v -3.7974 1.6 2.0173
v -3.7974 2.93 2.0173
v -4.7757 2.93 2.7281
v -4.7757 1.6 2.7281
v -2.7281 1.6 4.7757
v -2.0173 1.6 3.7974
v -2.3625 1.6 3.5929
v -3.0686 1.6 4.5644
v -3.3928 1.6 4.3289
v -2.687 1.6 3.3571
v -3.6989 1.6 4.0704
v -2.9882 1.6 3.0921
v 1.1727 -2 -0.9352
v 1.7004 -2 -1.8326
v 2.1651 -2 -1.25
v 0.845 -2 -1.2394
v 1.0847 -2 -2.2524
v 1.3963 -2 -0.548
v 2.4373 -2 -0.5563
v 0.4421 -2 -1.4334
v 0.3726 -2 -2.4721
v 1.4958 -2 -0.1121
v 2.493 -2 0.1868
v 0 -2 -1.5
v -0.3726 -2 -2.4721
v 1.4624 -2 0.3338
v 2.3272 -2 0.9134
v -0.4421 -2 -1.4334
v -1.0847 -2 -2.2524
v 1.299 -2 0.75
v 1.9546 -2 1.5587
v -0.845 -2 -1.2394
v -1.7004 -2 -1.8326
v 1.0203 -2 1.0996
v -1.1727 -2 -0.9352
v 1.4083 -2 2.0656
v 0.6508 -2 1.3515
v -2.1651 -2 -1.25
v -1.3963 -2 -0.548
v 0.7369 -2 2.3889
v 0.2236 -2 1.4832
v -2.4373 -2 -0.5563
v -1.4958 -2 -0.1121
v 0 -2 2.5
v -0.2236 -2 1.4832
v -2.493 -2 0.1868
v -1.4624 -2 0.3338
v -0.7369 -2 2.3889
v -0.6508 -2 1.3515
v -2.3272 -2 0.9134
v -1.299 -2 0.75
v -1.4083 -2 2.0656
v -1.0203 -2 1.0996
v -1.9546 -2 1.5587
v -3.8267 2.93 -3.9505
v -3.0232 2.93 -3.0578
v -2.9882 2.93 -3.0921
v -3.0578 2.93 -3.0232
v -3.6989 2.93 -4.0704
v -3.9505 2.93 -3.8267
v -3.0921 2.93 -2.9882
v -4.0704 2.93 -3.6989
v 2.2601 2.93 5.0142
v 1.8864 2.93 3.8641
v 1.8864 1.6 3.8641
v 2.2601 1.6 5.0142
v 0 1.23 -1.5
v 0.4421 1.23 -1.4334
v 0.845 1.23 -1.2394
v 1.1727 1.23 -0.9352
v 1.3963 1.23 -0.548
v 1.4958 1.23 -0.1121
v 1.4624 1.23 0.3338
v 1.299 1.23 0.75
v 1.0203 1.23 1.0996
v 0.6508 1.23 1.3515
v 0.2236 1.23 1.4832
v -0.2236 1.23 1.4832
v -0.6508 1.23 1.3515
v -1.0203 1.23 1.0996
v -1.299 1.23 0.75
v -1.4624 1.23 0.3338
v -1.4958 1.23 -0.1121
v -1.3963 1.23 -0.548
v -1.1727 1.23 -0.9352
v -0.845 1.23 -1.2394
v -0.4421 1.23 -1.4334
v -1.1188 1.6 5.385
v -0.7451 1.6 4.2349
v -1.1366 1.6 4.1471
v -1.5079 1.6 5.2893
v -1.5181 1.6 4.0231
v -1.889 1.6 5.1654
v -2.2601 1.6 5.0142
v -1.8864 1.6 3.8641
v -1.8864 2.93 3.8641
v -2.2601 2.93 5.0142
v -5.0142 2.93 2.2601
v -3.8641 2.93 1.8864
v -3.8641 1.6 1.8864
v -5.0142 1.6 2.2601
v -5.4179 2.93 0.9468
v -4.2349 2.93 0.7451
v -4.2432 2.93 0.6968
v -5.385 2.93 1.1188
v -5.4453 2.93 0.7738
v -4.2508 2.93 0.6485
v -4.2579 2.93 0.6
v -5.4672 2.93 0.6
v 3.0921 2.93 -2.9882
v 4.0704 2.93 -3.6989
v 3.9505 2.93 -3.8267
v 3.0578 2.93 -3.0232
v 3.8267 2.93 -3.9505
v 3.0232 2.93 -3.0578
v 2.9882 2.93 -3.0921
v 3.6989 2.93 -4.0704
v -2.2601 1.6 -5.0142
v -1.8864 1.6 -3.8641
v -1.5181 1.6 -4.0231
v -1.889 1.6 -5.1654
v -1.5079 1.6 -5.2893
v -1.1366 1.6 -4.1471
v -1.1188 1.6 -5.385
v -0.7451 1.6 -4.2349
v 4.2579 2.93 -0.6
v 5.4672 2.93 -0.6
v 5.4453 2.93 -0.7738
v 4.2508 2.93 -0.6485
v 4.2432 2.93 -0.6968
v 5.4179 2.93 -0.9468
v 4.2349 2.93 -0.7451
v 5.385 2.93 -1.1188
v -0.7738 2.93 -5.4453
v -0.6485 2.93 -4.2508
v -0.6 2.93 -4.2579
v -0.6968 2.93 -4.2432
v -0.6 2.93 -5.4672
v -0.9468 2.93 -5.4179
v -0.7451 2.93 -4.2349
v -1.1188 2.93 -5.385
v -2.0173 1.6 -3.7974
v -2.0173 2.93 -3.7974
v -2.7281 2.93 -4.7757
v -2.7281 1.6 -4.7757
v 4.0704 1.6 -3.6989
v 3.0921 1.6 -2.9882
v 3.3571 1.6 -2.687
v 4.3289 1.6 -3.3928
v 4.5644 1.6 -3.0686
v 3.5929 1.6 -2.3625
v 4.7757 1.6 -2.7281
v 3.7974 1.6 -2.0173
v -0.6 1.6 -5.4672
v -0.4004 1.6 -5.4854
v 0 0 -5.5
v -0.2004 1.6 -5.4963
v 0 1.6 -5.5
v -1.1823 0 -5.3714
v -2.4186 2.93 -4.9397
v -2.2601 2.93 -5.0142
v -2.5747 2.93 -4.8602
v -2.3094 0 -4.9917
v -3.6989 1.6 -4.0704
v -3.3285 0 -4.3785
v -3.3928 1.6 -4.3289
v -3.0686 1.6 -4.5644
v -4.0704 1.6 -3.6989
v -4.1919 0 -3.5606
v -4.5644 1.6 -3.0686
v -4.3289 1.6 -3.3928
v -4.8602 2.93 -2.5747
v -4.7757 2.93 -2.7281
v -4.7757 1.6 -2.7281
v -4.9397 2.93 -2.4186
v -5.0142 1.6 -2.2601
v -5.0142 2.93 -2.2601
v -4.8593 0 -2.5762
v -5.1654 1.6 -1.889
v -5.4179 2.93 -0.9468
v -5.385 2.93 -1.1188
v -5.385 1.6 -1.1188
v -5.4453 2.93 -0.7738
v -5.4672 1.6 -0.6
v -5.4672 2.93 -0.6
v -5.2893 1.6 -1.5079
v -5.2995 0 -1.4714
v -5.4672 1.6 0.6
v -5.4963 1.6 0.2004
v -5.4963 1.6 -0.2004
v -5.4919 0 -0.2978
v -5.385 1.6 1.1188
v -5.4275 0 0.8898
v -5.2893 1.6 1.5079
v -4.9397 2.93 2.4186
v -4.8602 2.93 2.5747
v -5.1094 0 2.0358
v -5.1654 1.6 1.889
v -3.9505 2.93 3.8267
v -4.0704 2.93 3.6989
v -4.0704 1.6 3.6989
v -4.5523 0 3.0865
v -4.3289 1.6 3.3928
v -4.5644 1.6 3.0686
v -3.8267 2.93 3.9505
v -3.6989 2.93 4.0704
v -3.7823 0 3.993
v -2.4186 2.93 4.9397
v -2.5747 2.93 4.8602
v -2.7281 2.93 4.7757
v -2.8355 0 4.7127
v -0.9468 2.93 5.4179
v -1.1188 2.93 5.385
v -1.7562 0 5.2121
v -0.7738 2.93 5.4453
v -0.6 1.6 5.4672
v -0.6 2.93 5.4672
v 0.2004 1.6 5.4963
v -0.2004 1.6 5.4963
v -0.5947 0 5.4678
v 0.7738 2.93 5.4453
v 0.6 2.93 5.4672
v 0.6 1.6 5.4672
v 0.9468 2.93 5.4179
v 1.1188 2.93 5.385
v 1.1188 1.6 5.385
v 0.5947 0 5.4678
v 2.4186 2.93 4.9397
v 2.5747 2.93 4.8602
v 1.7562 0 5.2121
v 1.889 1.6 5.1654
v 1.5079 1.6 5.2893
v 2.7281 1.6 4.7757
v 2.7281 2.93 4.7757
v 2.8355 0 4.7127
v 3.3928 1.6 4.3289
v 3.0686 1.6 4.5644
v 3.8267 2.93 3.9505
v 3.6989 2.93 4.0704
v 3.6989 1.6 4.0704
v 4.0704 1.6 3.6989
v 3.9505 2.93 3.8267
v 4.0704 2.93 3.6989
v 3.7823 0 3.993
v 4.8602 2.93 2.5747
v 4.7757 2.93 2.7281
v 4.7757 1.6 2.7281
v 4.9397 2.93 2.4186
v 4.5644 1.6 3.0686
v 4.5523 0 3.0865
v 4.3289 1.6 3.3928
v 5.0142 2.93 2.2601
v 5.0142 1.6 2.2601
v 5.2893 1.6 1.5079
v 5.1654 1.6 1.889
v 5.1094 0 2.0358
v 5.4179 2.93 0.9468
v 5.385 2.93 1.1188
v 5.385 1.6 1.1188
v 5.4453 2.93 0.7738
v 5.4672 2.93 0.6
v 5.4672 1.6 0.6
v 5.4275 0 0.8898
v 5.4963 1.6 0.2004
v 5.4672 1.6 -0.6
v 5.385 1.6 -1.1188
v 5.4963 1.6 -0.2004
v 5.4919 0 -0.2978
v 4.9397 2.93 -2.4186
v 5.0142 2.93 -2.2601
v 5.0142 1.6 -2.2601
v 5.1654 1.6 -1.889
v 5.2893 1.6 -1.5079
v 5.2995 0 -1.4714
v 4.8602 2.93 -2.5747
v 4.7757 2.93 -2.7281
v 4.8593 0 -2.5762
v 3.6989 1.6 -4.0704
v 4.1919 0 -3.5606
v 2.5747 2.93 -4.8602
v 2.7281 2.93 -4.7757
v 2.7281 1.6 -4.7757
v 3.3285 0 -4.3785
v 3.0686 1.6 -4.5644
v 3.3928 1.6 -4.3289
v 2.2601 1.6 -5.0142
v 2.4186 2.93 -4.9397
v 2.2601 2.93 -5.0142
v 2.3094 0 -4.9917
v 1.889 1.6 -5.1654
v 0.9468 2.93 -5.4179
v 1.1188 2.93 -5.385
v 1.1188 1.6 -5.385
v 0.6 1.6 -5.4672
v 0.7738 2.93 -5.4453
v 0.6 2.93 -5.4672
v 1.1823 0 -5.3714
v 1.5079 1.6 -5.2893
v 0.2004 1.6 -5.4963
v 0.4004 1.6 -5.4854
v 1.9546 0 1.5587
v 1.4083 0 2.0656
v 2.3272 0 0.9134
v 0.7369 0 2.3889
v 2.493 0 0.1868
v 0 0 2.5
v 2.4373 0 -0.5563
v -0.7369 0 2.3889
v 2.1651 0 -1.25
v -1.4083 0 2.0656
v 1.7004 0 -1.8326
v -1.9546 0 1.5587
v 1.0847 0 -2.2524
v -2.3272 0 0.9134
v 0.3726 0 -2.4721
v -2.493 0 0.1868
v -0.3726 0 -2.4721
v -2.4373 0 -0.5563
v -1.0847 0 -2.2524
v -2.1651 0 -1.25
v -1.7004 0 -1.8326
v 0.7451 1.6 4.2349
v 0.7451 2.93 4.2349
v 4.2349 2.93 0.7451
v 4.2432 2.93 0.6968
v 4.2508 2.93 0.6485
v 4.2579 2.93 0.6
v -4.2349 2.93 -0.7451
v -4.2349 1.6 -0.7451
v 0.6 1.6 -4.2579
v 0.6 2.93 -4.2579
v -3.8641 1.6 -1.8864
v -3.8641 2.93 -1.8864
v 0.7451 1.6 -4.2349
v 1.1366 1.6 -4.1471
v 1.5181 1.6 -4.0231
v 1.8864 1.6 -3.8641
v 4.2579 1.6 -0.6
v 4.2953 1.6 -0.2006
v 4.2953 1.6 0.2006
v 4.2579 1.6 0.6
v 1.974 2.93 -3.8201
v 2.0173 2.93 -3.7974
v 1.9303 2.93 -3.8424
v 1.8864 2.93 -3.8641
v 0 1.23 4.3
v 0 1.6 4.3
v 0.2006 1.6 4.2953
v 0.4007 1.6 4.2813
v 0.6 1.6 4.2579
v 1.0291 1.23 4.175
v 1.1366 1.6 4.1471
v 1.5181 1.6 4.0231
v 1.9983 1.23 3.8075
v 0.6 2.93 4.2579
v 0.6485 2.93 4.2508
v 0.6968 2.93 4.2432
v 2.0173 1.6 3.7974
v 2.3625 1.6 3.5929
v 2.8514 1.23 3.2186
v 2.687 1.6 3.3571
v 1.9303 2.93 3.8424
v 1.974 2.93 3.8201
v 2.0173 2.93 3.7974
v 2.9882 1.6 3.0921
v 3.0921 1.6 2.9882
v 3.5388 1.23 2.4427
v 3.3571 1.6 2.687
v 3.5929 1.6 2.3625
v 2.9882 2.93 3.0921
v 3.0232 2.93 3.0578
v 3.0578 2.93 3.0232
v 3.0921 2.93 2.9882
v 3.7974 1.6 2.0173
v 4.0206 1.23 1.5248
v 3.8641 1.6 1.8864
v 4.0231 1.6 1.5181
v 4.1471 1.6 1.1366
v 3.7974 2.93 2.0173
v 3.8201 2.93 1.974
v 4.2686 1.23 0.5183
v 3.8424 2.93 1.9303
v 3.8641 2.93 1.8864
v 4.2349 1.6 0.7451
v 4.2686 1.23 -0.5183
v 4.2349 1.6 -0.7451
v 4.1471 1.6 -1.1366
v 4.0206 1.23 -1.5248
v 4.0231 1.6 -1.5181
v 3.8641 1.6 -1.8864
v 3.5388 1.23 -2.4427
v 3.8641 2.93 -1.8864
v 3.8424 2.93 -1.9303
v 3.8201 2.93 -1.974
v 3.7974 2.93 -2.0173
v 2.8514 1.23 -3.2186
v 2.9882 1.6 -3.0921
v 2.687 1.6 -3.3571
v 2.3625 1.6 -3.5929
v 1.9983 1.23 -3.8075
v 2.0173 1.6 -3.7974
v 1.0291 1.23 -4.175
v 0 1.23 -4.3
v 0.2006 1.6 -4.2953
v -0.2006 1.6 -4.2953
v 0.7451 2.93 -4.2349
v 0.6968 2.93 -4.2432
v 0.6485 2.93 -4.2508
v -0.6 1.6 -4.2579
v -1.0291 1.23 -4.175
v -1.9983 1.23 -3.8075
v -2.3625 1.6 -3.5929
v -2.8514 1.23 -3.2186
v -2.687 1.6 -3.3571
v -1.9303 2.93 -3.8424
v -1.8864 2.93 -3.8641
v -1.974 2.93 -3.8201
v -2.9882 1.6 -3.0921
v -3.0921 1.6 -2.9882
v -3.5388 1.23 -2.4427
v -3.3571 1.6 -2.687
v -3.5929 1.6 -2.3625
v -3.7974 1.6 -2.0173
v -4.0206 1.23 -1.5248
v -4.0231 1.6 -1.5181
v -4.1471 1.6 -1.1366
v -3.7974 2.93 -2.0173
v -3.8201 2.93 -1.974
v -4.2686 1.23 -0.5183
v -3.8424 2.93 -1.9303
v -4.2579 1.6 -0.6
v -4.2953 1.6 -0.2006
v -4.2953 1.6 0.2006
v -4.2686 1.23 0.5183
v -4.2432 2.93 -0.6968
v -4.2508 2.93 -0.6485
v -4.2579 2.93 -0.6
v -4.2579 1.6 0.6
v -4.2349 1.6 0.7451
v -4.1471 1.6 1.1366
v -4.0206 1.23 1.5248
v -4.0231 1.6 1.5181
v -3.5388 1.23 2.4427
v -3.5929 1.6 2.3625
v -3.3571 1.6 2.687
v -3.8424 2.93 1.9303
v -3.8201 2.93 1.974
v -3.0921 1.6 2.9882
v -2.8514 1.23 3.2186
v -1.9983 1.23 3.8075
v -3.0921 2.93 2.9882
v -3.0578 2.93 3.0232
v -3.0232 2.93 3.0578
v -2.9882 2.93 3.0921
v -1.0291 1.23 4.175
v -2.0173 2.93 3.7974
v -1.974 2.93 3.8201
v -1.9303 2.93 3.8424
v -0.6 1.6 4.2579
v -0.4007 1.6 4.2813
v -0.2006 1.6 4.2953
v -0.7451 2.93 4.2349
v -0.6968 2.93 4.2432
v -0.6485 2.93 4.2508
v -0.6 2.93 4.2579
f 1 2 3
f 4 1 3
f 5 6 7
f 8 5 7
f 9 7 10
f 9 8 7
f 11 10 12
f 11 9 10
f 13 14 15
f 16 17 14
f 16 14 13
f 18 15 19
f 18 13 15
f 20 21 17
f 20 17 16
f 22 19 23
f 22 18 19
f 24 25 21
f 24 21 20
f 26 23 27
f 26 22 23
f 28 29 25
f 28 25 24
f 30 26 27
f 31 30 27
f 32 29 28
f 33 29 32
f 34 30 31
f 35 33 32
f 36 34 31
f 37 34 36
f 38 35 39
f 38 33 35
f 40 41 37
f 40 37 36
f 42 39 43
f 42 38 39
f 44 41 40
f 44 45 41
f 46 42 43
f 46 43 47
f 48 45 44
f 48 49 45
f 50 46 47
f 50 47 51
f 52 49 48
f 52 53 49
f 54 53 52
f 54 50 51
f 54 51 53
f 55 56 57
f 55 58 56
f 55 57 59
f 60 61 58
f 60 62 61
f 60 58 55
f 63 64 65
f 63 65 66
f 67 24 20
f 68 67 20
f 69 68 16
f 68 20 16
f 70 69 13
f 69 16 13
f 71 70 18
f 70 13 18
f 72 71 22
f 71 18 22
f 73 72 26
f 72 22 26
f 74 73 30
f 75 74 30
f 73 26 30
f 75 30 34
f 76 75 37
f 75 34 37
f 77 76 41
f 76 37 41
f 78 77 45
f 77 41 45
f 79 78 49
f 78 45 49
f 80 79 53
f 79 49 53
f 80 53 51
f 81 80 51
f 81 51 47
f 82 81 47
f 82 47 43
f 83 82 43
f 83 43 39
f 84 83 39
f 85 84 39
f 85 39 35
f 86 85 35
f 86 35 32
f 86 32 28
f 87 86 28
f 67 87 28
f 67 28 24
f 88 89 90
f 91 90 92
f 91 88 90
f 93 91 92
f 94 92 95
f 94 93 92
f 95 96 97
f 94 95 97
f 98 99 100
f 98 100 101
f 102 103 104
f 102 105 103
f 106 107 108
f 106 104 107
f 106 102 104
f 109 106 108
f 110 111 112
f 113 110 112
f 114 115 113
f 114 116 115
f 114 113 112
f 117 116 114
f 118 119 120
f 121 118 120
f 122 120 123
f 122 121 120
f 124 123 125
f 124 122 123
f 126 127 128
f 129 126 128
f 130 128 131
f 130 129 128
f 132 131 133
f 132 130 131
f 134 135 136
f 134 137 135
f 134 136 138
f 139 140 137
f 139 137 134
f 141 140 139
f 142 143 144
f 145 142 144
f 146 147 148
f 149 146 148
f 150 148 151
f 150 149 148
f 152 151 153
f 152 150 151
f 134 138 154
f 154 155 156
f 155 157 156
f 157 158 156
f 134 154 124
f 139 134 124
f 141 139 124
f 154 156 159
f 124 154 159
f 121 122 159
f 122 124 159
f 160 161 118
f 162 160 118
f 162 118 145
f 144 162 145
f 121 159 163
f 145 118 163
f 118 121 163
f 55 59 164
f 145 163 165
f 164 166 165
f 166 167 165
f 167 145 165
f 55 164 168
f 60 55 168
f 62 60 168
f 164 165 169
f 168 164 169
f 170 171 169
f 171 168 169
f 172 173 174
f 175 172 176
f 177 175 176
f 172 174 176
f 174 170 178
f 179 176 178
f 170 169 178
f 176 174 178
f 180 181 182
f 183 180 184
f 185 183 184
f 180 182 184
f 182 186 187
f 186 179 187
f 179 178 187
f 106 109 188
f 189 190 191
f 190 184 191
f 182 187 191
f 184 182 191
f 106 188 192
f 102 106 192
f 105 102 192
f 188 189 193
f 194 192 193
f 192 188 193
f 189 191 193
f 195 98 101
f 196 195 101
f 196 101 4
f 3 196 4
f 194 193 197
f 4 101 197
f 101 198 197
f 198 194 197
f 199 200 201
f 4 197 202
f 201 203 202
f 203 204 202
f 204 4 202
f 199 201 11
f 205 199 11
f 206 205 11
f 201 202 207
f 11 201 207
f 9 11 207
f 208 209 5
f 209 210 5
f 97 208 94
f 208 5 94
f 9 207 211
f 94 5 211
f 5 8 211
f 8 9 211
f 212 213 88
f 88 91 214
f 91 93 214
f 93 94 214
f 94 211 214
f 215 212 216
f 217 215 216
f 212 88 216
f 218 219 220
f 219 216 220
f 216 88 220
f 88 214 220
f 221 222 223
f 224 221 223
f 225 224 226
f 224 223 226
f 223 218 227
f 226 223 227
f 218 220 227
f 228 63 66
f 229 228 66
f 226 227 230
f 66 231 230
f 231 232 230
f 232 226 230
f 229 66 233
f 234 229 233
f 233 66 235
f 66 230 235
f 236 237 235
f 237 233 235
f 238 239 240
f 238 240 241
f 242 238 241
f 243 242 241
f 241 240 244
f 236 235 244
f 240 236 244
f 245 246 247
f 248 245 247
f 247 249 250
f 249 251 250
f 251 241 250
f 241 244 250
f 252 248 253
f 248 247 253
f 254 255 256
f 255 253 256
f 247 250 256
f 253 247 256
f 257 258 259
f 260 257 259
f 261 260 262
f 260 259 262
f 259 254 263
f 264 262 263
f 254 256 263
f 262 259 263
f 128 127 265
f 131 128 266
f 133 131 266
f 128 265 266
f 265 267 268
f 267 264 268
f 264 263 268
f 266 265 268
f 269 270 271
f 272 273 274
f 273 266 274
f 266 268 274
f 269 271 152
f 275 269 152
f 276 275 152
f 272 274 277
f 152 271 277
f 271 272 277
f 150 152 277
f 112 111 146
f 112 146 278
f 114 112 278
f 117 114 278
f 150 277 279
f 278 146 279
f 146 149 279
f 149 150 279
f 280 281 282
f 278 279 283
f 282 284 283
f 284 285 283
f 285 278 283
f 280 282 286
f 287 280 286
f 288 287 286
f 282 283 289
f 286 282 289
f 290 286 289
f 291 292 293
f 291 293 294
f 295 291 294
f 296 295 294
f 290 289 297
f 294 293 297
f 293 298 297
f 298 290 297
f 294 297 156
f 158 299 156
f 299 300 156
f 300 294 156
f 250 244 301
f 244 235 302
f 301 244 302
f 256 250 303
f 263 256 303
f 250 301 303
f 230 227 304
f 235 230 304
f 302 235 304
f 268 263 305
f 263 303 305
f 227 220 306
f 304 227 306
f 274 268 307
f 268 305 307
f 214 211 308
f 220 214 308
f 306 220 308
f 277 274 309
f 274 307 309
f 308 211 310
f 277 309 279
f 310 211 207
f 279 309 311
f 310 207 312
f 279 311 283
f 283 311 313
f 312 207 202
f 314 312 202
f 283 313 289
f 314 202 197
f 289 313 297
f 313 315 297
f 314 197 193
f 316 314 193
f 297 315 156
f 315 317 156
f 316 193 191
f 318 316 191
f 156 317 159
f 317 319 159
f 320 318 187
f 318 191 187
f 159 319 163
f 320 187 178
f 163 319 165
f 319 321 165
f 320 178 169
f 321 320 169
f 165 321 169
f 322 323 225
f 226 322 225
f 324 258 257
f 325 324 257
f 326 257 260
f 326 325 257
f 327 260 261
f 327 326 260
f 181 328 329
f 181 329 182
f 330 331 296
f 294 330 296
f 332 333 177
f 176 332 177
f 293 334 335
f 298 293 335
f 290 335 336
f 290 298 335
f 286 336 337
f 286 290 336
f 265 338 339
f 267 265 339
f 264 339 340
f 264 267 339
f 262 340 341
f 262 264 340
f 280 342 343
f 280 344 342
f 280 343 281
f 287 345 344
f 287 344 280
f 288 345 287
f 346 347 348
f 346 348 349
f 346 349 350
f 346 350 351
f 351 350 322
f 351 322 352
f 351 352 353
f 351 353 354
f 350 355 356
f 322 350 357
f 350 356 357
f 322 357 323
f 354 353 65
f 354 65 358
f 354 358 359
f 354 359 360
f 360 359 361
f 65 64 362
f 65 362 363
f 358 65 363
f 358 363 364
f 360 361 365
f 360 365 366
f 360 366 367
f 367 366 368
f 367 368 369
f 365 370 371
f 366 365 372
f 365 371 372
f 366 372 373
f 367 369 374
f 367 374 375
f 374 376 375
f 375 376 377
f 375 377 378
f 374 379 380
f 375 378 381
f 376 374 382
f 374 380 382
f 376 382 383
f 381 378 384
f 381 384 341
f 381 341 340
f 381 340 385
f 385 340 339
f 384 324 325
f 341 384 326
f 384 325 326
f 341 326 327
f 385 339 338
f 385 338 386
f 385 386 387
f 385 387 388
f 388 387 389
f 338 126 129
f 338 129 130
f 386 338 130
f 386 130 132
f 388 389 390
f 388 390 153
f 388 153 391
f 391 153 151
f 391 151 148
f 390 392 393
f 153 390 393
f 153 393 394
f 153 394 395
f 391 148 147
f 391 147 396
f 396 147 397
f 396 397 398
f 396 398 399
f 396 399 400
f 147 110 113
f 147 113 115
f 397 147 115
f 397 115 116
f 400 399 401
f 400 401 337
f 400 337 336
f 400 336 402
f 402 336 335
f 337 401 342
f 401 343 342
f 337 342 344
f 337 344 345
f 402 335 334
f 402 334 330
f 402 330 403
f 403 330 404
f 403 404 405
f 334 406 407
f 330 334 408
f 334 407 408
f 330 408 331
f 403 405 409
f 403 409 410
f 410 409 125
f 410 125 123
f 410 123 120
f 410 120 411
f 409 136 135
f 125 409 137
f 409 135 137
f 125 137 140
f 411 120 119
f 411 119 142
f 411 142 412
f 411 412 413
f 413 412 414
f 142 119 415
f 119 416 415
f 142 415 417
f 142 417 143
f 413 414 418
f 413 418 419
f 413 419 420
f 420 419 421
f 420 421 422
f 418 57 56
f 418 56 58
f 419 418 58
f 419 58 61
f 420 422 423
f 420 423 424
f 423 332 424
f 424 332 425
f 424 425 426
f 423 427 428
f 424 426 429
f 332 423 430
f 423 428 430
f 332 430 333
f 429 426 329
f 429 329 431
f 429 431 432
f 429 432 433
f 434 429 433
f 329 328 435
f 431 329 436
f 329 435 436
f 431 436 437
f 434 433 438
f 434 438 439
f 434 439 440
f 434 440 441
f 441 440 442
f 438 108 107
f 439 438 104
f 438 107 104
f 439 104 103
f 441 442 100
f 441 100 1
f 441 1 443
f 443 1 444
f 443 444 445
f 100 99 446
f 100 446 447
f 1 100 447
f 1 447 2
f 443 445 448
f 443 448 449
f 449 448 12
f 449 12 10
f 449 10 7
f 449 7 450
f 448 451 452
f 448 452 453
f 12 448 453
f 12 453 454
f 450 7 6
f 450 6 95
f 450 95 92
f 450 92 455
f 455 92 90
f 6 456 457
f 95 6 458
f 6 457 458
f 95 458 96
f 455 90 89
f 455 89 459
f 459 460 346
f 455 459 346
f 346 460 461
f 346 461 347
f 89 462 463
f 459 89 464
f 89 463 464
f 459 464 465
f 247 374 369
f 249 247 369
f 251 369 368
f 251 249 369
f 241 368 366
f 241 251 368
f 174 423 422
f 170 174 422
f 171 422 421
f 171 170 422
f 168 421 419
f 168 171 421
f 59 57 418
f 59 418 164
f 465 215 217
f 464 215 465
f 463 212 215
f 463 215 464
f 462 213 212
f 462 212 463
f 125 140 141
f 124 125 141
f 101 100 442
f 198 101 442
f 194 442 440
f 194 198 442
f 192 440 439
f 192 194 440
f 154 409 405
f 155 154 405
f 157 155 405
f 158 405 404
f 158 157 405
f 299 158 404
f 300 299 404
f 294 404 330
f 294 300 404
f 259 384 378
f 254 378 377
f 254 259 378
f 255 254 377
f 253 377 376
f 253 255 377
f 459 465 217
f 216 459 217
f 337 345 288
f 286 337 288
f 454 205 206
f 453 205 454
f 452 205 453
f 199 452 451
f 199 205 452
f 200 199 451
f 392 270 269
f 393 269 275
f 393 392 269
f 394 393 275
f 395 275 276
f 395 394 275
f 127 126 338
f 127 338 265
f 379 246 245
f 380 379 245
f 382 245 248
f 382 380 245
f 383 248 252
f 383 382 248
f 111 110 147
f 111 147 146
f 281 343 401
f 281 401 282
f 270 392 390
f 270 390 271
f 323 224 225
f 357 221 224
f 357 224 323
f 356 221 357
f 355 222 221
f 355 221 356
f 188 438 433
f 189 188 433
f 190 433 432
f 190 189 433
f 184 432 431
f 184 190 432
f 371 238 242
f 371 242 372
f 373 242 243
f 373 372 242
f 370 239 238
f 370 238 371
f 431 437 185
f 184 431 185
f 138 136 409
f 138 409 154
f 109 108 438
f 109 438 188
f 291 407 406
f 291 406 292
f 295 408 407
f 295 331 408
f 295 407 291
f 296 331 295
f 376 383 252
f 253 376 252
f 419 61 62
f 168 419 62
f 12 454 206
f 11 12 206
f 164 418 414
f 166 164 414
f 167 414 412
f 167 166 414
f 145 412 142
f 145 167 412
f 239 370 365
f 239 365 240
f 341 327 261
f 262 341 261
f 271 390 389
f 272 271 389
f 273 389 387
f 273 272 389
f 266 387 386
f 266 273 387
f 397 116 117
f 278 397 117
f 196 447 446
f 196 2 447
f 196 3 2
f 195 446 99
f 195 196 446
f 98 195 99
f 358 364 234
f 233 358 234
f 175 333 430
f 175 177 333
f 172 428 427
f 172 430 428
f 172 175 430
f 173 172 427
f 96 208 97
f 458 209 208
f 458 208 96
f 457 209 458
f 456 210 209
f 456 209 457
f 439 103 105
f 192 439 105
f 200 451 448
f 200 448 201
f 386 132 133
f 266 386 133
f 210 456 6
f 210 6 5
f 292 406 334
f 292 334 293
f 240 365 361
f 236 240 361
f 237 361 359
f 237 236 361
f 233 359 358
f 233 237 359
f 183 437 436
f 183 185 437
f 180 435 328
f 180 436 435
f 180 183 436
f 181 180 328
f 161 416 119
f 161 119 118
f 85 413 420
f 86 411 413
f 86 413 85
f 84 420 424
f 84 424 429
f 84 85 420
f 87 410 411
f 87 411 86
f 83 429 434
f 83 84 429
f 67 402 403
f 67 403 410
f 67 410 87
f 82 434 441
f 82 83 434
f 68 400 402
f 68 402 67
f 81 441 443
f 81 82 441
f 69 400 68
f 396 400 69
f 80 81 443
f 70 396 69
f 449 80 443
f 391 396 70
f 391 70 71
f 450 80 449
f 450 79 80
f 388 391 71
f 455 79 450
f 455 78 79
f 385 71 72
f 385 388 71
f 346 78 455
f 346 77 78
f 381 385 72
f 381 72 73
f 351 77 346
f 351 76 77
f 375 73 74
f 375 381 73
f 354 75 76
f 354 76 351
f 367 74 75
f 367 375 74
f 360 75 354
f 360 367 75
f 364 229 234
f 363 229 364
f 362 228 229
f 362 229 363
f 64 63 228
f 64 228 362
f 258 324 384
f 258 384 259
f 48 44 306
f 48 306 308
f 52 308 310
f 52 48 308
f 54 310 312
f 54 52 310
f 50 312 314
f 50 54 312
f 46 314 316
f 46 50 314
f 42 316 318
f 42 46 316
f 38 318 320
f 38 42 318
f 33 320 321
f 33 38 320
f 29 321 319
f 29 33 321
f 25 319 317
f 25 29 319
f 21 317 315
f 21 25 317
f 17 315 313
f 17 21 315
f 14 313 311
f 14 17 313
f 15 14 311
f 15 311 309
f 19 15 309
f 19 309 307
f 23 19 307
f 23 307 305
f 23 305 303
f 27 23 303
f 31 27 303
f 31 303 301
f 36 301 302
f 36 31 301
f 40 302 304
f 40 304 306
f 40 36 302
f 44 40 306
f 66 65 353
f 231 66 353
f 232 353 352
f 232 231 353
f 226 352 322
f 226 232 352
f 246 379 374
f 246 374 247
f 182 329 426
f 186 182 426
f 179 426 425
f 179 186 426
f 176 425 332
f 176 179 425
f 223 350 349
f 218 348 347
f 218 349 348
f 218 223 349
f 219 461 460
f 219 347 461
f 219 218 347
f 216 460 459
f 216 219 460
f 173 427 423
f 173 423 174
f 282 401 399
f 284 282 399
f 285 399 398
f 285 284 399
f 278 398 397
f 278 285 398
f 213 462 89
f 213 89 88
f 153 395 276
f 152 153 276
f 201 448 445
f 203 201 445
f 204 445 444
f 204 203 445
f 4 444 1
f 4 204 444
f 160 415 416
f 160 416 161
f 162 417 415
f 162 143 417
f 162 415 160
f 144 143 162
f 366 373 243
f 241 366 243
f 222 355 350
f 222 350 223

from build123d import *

# Parameters (mm, degrees)
SKETCH_4_R               = 5.5
SKETCH_4_R_2             = 1.5
EXTRUDE_1_DEPTH          = 2.93
EXTRUDE_START            = 2
SKETCH_5_R               = 2.5
SKETCH_5_R_2             = 1.5
EXTRUDE_2_DEPTH          = 2
SKETCH_6_R               = 4.3
CUT_EXTRUDE_1_DEPTH      = 1.7
SKETCH_7_W               = 1.2
SKETCH_7_H               = 1.242066229
CUT_EXTRUDE_2_DEPTH      = 1.33
PATTERN_CIRCULAR_1_COUNT = 20


with BuildPart() as part:
    # 草图4 → 凸台-拉伸1 (new body)
    with BuildSketch(Plane(origin=(0, 0, 0), x_dir=(1, 0, 0), z_dir=(0, 1, 0))):
        with Locations(Location((0, 0, 0), (0, 0, 90))):
            Circle(SKETCH_4_R)
        with Locations(Location((0, 0, 0), (0, 0, 90))):
            Circle(SKETCH_4_R_2, mode=Mode.SUBTRACT)
    extrude(amount=EXTRUDE_1_DEPTH)

    # 草图5 → 凸台-拉伸2 (add)
    with BuildSketch(Plane.XZ.offset(EXTRUDE_START)):
        with Locations(Location((0, 0, 0), (0, 0, 90))):
            Circle(SKETCH_5_R)
        with Locations(Location((0, 0, 0), (0, 0, 270))):
            Circle(SKETCH_5_R_2, mode=Mode.SUBTRACT)
    extrude(amount=-EXTRUDE_2_DEPTH)

    # 草图6 → 切除-拉伸1 (cut)
    with BuildSketch(Plane(origin=(0, 2.93, 0), x_dir=(1, 0, 0), z_dir=(0, 1, 0))):
        with Locations(Location((0, 0, 0), (0, 0, 270))):
            Circle(SKETCH_6_R)
    extrude(amount=-CUT_EXTRUDE_1_DEPTH, mode=Mode.SUBTRACT)

    # 草图7 → 切除-拉伸2 (cut)
    with BuildSketch(Plane(origin=(0, 2.93, 0), x_dir=(1, 0, 0), z_dir=(0, 1, 0))):
        with Locations((0, 4.878966886)):
            Rectangle(SKETCH_7_W, SKETCH_7_H)
    cut_extrude_2 = extrude(amount=-CUT_EXTRUDE_2_DEPTH, mode=Mode.SUBTRACT)

    # 阵列(圆周)1: 切除-拉伸2 ×20 about axis
    pattern_circular_1_axis = Axis((0, 0, 0), (0, 1, 0))
    for i in range(1, PATTERN_CIRCULAR_1_COUNT):
        add(cut_extrude_2.rotate(pattern_circular_1_axis, i * 360 / PATTERN_CIRCULAR_1_COUNT), mode=Mode.SUBTRACT)


solid = part.part
